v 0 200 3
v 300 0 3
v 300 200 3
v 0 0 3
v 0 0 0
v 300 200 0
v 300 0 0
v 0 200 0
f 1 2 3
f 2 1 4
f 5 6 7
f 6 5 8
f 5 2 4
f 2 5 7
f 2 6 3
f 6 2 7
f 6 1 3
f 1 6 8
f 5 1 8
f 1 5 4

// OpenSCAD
$fn = 64;

sheet_x = 300;
sheet_y = 200;
sheet_thickness = 3;

color([0.85, 0.85, 0.85])
cube([sheet_x, sheet_y, sheet_thickness], center=false);
